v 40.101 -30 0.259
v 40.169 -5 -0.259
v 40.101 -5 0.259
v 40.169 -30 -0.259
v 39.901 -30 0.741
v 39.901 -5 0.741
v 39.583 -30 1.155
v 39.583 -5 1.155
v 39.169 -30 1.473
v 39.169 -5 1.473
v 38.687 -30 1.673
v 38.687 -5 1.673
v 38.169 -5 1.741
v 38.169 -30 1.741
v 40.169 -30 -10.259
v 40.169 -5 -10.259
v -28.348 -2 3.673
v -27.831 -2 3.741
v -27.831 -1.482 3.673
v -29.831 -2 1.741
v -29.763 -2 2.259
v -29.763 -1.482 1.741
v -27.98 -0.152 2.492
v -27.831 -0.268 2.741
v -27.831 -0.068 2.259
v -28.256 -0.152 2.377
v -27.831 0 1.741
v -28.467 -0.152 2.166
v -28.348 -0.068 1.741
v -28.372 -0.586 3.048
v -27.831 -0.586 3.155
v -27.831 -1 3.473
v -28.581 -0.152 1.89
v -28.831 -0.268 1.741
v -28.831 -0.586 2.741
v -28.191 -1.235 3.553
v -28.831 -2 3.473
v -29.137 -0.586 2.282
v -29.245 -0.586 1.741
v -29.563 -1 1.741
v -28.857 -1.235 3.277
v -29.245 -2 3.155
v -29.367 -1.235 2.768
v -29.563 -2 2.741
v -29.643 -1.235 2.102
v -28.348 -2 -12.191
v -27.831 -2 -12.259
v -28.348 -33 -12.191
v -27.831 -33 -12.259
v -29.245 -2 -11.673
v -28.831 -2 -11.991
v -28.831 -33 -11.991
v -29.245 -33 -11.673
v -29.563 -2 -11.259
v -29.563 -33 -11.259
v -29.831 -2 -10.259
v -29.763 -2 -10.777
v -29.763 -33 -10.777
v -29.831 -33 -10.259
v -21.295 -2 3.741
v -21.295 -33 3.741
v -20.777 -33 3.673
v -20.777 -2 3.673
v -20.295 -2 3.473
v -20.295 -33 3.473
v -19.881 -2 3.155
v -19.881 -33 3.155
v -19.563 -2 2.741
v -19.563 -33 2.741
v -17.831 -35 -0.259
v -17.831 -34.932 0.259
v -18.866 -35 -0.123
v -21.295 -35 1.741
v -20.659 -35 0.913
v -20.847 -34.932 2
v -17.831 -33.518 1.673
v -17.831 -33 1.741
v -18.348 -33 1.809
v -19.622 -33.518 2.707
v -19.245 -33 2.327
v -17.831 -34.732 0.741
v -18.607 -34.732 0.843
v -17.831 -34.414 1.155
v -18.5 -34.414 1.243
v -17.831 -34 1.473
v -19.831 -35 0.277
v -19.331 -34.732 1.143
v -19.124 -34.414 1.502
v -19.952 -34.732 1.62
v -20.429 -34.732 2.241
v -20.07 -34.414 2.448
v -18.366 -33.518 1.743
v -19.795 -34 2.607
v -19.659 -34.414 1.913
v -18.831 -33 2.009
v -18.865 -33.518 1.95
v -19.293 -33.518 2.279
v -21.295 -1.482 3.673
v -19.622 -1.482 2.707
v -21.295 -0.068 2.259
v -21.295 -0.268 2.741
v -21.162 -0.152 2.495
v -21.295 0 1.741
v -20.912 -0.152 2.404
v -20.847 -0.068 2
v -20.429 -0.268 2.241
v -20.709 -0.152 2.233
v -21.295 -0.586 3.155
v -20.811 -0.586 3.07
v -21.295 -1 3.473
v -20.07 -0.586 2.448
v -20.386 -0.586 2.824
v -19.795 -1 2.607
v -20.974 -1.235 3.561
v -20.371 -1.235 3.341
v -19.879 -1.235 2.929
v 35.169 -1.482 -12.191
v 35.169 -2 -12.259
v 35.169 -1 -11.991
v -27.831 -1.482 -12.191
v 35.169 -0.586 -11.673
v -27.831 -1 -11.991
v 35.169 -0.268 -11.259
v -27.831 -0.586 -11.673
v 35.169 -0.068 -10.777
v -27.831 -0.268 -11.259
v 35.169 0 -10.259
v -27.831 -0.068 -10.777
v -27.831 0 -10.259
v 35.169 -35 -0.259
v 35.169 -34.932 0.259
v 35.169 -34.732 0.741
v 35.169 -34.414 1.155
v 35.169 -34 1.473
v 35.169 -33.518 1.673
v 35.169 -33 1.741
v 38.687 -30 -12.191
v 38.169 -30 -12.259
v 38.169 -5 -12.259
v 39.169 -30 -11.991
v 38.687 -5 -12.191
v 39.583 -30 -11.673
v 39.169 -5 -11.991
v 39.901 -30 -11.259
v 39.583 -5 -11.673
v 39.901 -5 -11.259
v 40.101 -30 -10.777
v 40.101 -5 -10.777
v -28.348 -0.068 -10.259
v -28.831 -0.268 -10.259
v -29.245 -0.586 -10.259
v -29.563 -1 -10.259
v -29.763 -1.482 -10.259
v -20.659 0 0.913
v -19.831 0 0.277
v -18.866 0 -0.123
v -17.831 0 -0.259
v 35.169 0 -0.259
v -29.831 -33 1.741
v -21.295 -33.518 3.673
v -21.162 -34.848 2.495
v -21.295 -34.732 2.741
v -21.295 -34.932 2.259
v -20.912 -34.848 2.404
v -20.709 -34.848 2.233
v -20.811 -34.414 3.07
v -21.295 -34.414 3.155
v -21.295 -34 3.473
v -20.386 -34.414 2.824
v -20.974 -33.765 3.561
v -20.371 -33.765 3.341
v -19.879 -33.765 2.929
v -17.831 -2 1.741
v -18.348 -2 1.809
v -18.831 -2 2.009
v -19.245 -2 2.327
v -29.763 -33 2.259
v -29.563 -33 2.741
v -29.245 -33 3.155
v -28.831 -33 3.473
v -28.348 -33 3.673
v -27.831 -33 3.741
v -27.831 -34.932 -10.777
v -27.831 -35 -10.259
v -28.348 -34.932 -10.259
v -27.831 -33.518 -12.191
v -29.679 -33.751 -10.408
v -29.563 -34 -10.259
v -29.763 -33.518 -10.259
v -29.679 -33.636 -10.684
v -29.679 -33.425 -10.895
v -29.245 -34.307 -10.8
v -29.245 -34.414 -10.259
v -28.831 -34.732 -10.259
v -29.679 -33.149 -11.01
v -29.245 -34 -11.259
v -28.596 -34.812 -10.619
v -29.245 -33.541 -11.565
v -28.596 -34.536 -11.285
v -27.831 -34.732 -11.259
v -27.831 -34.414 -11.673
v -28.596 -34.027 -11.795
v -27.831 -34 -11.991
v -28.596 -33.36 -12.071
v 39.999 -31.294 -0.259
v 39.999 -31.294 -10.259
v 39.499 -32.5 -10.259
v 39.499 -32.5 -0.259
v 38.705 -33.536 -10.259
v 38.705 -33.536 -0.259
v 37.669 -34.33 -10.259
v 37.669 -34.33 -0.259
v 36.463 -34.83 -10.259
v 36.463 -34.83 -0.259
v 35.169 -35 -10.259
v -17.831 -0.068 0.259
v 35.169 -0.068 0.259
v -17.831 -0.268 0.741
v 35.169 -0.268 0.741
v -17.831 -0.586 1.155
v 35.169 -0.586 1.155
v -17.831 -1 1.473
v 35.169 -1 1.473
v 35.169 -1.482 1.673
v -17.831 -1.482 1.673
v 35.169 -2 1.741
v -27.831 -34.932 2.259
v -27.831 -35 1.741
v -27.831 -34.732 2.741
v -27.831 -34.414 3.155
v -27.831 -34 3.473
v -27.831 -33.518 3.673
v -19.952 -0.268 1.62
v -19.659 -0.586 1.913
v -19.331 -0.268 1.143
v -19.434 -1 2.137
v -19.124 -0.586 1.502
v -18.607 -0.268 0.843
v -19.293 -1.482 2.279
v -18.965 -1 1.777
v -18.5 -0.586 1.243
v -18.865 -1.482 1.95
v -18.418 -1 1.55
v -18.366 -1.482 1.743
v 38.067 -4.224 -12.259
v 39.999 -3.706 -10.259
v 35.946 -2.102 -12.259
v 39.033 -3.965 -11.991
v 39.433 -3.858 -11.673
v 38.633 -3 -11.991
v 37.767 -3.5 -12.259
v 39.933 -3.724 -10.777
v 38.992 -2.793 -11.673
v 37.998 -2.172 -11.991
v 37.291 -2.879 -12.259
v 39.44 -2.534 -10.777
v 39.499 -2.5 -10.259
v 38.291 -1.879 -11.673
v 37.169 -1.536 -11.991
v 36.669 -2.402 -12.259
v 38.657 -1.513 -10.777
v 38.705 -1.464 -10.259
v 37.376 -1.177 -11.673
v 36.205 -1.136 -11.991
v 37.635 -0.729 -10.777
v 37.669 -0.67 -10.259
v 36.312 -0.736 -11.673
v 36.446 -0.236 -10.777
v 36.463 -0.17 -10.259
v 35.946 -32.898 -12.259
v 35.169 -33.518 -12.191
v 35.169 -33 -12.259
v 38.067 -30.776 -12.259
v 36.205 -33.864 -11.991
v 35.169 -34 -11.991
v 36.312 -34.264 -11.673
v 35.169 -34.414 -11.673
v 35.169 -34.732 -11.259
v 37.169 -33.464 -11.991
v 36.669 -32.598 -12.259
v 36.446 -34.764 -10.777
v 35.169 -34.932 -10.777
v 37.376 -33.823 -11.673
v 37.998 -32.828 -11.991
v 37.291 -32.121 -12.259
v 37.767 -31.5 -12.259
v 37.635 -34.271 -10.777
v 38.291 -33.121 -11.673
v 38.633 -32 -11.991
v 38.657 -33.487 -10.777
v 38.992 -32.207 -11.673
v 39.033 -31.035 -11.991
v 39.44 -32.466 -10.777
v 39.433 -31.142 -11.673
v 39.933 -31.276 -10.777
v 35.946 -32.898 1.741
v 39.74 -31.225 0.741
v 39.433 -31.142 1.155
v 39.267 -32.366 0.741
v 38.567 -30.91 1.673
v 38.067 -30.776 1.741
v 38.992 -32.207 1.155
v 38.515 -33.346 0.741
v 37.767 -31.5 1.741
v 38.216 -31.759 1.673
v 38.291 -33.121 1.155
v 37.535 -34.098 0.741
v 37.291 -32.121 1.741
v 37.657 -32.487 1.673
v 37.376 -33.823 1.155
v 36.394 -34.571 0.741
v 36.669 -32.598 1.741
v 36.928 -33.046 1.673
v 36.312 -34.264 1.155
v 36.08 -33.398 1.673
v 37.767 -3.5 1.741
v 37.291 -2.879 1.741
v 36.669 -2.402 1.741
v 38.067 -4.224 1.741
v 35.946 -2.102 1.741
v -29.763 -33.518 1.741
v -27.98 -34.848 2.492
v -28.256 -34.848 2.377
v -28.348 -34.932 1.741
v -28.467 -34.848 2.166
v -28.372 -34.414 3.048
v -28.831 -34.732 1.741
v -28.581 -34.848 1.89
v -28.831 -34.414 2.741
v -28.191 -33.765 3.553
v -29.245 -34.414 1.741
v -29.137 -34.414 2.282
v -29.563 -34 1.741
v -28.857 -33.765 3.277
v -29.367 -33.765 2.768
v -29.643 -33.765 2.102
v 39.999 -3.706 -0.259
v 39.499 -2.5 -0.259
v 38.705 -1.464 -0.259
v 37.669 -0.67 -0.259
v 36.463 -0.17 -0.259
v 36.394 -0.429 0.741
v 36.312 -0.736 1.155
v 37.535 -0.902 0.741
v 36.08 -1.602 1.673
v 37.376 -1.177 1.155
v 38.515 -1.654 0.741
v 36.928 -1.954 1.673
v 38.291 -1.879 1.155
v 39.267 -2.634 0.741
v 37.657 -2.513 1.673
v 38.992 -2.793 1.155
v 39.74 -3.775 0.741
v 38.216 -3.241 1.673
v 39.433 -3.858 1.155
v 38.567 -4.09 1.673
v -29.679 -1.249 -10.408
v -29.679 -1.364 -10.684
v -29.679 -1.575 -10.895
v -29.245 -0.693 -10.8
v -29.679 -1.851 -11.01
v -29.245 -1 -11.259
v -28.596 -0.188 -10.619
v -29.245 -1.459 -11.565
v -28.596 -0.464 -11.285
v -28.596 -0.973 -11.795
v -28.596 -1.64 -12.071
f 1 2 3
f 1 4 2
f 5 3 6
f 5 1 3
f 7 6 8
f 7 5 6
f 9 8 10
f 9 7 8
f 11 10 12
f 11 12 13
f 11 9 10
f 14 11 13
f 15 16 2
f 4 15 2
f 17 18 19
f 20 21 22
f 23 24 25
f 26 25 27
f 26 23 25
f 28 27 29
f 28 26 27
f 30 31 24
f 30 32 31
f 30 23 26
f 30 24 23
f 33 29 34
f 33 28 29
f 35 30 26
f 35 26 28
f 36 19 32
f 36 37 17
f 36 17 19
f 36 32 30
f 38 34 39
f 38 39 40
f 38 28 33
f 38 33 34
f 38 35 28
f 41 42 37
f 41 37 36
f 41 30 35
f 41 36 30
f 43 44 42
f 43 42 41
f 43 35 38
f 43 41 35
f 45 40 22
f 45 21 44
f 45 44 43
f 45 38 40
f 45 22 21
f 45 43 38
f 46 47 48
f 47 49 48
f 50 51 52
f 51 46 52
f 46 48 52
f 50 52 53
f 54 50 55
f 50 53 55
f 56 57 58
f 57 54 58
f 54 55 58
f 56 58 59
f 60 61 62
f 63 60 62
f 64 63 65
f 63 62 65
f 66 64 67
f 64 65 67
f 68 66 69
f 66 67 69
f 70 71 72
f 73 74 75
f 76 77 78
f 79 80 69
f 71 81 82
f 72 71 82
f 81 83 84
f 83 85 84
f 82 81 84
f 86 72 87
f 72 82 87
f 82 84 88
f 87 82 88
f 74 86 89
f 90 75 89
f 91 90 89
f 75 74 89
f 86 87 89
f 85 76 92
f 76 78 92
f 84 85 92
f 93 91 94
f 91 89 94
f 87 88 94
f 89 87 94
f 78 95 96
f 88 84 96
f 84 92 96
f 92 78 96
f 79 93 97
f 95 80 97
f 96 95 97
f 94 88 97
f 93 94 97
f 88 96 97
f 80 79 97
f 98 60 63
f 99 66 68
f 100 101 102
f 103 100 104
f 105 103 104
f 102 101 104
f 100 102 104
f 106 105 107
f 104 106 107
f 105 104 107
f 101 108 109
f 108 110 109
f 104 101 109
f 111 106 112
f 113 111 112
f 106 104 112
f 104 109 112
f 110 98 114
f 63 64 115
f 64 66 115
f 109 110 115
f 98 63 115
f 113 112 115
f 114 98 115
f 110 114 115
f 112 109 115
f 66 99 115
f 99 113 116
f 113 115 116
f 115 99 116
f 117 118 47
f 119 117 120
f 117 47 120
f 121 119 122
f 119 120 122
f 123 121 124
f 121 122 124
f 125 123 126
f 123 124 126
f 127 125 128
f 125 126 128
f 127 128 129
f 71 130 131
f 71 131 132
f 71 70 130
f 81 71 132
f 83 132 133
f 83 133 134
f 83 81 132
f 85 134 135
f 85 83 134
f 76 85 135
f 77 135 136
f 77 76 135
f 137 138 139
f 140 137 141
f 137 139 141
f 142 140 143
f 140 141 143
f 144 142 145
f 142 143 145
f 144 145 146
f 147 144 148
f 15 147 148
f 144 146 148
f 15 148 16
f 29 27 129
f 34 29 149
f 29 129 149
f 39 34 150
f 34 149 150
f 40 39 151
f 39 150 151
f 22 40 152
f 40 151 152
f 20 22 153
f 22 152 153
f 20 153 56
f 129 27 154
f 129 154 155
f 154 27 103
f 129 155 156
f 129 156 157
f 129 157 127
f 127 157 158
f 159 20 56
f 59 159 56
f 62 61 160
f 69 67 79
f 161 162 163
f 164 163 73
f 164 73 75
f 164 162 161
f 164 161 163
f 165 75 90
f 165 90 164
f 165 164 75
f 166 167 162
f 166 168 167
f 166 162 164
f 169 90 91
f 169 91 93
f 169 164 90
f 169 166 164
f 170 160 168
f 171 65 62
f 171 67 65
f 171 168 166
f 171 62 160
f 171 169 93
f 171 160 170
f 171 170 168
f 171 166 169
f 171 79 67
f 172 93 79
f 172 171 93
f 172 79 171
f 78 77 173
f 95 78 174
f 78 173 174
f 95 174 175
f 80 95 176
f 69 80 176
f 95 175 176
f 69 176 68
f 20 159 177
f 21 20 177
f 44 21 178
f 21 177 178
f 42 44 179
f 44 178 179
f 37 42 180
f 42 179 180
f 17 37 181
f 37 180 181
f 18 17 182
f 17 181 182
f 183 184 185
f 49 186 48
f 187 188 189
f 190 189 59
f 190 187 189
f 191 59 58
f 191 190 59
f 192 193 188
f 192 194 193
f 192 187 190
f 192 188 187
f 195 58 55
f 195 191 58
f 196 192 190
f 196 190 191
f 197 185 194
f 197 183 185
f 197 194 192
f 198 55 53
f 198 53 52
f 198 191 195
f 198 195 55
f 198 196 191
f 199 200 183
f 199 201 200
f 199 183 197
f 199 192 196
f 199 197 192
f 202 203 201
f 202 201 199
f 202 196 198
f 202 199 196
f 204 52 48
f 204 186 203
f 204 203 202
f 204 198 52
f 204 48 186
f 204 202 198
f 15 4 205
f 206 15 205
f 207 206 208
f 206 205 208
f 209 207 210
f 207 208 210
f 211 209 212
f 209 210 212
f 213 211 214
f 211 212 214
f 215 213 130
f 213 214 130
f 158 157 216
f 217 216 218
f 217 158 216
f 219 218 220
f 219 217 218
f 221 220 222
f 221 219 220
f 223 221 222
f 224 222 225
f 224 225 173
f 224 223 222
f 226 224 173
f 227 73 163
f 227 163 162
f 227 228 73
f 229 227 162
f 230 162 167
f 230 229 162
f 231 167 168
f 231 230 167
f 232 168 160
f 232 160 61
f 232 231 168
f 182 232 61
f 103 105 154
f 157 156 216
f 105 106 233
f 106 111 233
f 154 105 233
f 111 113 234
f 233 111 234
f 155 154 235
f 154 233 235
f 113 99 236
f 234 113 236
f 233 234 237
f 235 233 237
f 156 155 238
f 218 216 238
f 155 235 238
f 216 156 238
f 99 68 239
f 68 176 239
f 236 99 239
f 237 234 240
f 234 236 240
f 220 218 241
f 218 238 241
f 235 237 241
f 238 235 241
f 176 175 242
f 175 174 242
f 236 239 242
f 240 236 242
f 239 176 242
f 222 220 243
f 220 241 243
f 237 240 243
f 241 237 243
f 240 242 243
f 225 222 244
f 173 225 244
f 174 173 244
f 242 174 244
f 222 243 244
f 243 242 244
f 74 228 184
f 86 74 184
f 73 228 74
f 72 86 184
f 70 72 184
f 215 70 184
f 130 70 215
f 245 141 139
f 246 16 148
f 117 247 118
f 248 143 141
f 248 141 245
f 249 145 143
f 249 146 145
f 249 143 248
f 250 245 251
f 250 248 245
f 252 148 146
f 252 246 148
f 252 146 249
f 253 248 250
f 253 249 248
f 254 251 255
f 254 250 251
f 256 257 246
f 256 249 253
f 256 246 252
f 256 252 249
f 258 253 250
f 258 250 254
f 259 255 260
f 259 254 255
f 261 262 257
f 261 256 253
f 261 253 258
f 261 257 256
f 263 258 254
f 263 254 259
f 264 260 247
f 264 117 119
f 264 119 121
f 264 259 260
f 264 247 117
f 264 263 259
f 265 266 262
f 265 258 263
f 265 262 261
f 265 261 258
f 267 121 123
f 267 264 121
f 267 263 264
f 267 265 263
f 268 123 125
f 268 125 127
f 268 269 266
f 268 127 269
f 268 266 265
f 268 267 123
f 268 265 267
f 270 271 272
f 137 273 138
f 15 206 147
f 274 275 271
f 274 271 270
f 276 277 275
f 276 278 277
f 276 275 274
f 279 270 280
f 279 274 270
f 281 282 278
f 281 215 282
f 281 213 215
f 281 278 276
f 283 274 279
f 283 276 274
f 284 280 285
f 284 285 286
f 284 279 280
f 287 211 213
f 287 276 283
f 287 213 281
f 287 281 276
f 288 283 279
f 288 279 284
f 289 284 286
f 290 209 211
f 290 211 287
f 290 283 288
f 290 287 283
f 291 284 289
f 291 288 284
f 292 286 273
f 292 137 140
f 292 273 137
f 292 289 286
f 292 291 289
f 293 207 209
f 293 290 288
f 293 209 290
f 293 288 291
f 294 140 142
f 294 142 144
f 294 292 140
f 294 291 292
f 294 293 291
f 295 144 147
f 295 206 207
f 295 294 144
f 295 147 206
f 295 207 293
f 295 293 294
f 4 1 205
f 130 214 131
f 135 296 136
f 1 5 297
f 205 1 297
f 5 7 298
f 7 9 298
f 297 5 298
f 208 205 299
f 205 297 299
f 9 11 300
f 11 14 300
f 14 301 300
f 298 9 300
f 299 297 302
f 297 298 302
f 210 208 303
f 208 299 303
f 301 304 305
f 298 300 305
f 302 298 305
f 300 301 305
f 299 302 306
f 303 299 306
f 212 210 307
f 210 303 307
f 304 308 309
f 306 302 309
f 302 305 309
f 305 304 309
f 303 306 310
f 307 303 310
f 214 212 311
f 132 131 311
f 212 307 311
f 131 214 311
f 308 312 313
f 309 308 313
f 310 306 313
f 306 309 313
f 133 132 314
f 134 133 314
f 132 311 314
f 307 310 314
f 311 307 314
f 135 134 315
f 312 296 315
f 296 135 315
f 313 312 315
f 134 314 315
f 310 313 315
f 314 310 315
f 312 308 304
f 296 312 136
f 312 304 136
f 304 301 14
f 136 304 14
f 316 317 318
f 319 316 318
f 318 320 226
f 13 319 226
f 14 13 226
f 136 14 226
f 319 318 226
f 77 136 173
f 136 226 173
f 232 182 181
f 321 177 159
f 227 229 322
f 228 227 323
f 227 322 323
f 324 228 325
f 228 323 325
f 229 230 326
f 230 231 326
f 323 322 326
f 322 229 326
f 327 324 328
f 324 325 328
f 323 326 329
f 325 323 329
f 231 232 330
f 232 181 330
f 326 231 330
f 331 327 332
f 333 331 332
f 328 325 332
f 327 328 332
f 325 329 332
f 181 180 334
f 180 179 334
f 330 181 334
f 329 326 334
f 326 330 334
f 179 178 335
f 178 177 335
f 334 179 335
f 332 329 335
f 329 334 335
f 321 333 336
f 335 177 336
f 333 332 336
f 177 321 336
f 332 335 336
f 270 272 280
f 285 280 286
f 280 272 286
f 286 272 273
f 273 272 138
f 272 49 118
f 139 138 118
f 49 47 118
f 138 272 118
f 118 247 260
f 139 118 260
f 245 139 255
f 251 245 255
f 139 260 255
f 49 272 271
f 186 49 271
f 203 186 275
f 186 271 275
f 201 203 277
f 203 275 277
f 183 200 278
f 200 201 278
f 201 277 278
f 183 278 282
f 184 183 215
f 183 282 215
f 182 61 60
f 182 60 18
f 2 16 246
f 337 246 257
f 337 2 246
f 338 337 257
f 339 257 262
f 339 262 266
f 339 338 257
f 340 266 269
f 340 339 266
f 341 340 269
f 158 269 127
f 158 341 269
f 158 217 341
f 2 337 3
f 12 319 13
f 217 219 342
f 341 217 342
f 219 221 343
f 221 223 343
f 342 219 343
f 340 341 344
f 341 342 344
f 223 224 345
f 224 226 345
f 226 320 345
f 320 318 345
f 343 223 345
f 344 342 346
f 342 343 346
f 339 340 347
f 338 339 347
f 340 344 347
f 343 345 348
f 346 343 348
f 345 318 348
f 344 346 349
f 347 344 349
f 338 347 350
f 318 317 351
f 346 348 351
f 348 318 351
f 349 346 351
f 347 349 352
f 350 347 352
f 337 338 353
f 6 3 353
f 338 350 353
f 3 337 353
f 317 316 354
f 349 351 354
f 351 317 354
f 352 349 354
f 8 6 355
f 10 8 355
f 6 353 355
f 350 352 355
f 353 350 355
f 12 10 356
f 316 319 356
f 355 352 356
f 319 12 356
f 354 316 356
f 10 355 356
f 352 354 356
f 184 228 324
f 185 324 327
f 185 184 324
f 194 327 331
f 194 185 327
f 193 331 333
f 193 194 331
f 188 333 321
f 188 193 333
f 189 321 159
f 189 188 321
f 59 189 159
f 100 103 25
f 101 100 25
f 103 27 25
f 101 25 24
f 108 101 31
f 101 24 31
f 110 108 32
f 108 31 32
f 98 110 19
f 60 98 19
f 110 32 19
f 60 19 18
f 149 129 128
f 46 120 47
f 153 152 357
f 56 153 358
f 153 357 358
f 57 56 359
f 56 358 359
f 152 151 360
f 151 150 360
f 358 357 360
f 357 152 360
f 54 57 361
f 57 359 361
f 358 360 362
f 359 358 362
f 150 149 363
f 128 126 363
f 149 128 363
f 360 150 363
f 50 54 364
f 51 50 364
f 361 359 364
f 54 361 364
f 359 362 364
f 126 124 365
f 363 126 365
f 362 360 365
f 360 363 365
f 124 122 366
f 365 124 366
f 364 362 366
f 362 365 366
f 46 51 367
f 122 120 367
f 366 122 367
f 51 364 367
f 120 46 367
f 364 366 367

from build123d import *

# Parameters (mm, degrees)
F1_DEPTH = 35
F2_R     = 5
F3_R     = 2


with BuildPart() as f1:
    # F0 (on Front) → F1 (new body)
    with BuildSketch(Plane.XZ):
        with BuildLine():
            Line((-19.8307685554, 3.7411112362), (-29.8307685554, 3.7411112362))
            Line((-29.8307685554, 3.7411112362), (-29.8307685554, -12.2588887638))
            Line((-29.8307685554, -12.2588887638), (40.1692314446, -12.2588887638))
            Line((40.1692314446, -12.2588887638), (40.1692314446, 1.7411112362))
            Line((40.1692314446, 1.7411112362), (-17.8307685554, 1.7411112362))
            ThreePointArc((-17.8307685554, 1.7411112362), (-19.2449821178, 2.3268976739), (-19.8307685554, 3.7411112362))
        make_face()
    extrude(amount=F1_DEPTH)

    # F2
    f2_edges = [f1.edges().sort_by_distance(p)[0] for p in [
        (40.169231, -35, -5.258889),
        (40.169231, 0, -5.258889),
    ]]
    fillet(f2_edges, radius=F2_R)

    # F3
    f3_edges = [f1.edges().sort_by_distance(p)[0] for p in [
        (-19.830769, -17.5, 3.741111),
        (-29.830769, -17.5, 3.741111),
        (-24.830769, 0, 3.741111),
        (-24.830769, -35, 3.741111),
        (2.669231, -35, -12.258889),
        (35.169231, -35, -5.258889),
        (-29.830769, -35, -4.258889),
        (8.669231, -35, 1.741111),
        (-19.244982, -35, 2.326898),
        (2.669231, 0, -12.258889),
        (35.169231, 0, -5.258889),
        (-29.830769, 0, -4.258889),
        (8.669231, 0, 1.741111),
        (-19.244982, 0, 2.326898),
        (-29.830769, -17.5, -12.258889),
    ]]
    fillet(f3_edges, radius=F3_R)


solid = f1.part
